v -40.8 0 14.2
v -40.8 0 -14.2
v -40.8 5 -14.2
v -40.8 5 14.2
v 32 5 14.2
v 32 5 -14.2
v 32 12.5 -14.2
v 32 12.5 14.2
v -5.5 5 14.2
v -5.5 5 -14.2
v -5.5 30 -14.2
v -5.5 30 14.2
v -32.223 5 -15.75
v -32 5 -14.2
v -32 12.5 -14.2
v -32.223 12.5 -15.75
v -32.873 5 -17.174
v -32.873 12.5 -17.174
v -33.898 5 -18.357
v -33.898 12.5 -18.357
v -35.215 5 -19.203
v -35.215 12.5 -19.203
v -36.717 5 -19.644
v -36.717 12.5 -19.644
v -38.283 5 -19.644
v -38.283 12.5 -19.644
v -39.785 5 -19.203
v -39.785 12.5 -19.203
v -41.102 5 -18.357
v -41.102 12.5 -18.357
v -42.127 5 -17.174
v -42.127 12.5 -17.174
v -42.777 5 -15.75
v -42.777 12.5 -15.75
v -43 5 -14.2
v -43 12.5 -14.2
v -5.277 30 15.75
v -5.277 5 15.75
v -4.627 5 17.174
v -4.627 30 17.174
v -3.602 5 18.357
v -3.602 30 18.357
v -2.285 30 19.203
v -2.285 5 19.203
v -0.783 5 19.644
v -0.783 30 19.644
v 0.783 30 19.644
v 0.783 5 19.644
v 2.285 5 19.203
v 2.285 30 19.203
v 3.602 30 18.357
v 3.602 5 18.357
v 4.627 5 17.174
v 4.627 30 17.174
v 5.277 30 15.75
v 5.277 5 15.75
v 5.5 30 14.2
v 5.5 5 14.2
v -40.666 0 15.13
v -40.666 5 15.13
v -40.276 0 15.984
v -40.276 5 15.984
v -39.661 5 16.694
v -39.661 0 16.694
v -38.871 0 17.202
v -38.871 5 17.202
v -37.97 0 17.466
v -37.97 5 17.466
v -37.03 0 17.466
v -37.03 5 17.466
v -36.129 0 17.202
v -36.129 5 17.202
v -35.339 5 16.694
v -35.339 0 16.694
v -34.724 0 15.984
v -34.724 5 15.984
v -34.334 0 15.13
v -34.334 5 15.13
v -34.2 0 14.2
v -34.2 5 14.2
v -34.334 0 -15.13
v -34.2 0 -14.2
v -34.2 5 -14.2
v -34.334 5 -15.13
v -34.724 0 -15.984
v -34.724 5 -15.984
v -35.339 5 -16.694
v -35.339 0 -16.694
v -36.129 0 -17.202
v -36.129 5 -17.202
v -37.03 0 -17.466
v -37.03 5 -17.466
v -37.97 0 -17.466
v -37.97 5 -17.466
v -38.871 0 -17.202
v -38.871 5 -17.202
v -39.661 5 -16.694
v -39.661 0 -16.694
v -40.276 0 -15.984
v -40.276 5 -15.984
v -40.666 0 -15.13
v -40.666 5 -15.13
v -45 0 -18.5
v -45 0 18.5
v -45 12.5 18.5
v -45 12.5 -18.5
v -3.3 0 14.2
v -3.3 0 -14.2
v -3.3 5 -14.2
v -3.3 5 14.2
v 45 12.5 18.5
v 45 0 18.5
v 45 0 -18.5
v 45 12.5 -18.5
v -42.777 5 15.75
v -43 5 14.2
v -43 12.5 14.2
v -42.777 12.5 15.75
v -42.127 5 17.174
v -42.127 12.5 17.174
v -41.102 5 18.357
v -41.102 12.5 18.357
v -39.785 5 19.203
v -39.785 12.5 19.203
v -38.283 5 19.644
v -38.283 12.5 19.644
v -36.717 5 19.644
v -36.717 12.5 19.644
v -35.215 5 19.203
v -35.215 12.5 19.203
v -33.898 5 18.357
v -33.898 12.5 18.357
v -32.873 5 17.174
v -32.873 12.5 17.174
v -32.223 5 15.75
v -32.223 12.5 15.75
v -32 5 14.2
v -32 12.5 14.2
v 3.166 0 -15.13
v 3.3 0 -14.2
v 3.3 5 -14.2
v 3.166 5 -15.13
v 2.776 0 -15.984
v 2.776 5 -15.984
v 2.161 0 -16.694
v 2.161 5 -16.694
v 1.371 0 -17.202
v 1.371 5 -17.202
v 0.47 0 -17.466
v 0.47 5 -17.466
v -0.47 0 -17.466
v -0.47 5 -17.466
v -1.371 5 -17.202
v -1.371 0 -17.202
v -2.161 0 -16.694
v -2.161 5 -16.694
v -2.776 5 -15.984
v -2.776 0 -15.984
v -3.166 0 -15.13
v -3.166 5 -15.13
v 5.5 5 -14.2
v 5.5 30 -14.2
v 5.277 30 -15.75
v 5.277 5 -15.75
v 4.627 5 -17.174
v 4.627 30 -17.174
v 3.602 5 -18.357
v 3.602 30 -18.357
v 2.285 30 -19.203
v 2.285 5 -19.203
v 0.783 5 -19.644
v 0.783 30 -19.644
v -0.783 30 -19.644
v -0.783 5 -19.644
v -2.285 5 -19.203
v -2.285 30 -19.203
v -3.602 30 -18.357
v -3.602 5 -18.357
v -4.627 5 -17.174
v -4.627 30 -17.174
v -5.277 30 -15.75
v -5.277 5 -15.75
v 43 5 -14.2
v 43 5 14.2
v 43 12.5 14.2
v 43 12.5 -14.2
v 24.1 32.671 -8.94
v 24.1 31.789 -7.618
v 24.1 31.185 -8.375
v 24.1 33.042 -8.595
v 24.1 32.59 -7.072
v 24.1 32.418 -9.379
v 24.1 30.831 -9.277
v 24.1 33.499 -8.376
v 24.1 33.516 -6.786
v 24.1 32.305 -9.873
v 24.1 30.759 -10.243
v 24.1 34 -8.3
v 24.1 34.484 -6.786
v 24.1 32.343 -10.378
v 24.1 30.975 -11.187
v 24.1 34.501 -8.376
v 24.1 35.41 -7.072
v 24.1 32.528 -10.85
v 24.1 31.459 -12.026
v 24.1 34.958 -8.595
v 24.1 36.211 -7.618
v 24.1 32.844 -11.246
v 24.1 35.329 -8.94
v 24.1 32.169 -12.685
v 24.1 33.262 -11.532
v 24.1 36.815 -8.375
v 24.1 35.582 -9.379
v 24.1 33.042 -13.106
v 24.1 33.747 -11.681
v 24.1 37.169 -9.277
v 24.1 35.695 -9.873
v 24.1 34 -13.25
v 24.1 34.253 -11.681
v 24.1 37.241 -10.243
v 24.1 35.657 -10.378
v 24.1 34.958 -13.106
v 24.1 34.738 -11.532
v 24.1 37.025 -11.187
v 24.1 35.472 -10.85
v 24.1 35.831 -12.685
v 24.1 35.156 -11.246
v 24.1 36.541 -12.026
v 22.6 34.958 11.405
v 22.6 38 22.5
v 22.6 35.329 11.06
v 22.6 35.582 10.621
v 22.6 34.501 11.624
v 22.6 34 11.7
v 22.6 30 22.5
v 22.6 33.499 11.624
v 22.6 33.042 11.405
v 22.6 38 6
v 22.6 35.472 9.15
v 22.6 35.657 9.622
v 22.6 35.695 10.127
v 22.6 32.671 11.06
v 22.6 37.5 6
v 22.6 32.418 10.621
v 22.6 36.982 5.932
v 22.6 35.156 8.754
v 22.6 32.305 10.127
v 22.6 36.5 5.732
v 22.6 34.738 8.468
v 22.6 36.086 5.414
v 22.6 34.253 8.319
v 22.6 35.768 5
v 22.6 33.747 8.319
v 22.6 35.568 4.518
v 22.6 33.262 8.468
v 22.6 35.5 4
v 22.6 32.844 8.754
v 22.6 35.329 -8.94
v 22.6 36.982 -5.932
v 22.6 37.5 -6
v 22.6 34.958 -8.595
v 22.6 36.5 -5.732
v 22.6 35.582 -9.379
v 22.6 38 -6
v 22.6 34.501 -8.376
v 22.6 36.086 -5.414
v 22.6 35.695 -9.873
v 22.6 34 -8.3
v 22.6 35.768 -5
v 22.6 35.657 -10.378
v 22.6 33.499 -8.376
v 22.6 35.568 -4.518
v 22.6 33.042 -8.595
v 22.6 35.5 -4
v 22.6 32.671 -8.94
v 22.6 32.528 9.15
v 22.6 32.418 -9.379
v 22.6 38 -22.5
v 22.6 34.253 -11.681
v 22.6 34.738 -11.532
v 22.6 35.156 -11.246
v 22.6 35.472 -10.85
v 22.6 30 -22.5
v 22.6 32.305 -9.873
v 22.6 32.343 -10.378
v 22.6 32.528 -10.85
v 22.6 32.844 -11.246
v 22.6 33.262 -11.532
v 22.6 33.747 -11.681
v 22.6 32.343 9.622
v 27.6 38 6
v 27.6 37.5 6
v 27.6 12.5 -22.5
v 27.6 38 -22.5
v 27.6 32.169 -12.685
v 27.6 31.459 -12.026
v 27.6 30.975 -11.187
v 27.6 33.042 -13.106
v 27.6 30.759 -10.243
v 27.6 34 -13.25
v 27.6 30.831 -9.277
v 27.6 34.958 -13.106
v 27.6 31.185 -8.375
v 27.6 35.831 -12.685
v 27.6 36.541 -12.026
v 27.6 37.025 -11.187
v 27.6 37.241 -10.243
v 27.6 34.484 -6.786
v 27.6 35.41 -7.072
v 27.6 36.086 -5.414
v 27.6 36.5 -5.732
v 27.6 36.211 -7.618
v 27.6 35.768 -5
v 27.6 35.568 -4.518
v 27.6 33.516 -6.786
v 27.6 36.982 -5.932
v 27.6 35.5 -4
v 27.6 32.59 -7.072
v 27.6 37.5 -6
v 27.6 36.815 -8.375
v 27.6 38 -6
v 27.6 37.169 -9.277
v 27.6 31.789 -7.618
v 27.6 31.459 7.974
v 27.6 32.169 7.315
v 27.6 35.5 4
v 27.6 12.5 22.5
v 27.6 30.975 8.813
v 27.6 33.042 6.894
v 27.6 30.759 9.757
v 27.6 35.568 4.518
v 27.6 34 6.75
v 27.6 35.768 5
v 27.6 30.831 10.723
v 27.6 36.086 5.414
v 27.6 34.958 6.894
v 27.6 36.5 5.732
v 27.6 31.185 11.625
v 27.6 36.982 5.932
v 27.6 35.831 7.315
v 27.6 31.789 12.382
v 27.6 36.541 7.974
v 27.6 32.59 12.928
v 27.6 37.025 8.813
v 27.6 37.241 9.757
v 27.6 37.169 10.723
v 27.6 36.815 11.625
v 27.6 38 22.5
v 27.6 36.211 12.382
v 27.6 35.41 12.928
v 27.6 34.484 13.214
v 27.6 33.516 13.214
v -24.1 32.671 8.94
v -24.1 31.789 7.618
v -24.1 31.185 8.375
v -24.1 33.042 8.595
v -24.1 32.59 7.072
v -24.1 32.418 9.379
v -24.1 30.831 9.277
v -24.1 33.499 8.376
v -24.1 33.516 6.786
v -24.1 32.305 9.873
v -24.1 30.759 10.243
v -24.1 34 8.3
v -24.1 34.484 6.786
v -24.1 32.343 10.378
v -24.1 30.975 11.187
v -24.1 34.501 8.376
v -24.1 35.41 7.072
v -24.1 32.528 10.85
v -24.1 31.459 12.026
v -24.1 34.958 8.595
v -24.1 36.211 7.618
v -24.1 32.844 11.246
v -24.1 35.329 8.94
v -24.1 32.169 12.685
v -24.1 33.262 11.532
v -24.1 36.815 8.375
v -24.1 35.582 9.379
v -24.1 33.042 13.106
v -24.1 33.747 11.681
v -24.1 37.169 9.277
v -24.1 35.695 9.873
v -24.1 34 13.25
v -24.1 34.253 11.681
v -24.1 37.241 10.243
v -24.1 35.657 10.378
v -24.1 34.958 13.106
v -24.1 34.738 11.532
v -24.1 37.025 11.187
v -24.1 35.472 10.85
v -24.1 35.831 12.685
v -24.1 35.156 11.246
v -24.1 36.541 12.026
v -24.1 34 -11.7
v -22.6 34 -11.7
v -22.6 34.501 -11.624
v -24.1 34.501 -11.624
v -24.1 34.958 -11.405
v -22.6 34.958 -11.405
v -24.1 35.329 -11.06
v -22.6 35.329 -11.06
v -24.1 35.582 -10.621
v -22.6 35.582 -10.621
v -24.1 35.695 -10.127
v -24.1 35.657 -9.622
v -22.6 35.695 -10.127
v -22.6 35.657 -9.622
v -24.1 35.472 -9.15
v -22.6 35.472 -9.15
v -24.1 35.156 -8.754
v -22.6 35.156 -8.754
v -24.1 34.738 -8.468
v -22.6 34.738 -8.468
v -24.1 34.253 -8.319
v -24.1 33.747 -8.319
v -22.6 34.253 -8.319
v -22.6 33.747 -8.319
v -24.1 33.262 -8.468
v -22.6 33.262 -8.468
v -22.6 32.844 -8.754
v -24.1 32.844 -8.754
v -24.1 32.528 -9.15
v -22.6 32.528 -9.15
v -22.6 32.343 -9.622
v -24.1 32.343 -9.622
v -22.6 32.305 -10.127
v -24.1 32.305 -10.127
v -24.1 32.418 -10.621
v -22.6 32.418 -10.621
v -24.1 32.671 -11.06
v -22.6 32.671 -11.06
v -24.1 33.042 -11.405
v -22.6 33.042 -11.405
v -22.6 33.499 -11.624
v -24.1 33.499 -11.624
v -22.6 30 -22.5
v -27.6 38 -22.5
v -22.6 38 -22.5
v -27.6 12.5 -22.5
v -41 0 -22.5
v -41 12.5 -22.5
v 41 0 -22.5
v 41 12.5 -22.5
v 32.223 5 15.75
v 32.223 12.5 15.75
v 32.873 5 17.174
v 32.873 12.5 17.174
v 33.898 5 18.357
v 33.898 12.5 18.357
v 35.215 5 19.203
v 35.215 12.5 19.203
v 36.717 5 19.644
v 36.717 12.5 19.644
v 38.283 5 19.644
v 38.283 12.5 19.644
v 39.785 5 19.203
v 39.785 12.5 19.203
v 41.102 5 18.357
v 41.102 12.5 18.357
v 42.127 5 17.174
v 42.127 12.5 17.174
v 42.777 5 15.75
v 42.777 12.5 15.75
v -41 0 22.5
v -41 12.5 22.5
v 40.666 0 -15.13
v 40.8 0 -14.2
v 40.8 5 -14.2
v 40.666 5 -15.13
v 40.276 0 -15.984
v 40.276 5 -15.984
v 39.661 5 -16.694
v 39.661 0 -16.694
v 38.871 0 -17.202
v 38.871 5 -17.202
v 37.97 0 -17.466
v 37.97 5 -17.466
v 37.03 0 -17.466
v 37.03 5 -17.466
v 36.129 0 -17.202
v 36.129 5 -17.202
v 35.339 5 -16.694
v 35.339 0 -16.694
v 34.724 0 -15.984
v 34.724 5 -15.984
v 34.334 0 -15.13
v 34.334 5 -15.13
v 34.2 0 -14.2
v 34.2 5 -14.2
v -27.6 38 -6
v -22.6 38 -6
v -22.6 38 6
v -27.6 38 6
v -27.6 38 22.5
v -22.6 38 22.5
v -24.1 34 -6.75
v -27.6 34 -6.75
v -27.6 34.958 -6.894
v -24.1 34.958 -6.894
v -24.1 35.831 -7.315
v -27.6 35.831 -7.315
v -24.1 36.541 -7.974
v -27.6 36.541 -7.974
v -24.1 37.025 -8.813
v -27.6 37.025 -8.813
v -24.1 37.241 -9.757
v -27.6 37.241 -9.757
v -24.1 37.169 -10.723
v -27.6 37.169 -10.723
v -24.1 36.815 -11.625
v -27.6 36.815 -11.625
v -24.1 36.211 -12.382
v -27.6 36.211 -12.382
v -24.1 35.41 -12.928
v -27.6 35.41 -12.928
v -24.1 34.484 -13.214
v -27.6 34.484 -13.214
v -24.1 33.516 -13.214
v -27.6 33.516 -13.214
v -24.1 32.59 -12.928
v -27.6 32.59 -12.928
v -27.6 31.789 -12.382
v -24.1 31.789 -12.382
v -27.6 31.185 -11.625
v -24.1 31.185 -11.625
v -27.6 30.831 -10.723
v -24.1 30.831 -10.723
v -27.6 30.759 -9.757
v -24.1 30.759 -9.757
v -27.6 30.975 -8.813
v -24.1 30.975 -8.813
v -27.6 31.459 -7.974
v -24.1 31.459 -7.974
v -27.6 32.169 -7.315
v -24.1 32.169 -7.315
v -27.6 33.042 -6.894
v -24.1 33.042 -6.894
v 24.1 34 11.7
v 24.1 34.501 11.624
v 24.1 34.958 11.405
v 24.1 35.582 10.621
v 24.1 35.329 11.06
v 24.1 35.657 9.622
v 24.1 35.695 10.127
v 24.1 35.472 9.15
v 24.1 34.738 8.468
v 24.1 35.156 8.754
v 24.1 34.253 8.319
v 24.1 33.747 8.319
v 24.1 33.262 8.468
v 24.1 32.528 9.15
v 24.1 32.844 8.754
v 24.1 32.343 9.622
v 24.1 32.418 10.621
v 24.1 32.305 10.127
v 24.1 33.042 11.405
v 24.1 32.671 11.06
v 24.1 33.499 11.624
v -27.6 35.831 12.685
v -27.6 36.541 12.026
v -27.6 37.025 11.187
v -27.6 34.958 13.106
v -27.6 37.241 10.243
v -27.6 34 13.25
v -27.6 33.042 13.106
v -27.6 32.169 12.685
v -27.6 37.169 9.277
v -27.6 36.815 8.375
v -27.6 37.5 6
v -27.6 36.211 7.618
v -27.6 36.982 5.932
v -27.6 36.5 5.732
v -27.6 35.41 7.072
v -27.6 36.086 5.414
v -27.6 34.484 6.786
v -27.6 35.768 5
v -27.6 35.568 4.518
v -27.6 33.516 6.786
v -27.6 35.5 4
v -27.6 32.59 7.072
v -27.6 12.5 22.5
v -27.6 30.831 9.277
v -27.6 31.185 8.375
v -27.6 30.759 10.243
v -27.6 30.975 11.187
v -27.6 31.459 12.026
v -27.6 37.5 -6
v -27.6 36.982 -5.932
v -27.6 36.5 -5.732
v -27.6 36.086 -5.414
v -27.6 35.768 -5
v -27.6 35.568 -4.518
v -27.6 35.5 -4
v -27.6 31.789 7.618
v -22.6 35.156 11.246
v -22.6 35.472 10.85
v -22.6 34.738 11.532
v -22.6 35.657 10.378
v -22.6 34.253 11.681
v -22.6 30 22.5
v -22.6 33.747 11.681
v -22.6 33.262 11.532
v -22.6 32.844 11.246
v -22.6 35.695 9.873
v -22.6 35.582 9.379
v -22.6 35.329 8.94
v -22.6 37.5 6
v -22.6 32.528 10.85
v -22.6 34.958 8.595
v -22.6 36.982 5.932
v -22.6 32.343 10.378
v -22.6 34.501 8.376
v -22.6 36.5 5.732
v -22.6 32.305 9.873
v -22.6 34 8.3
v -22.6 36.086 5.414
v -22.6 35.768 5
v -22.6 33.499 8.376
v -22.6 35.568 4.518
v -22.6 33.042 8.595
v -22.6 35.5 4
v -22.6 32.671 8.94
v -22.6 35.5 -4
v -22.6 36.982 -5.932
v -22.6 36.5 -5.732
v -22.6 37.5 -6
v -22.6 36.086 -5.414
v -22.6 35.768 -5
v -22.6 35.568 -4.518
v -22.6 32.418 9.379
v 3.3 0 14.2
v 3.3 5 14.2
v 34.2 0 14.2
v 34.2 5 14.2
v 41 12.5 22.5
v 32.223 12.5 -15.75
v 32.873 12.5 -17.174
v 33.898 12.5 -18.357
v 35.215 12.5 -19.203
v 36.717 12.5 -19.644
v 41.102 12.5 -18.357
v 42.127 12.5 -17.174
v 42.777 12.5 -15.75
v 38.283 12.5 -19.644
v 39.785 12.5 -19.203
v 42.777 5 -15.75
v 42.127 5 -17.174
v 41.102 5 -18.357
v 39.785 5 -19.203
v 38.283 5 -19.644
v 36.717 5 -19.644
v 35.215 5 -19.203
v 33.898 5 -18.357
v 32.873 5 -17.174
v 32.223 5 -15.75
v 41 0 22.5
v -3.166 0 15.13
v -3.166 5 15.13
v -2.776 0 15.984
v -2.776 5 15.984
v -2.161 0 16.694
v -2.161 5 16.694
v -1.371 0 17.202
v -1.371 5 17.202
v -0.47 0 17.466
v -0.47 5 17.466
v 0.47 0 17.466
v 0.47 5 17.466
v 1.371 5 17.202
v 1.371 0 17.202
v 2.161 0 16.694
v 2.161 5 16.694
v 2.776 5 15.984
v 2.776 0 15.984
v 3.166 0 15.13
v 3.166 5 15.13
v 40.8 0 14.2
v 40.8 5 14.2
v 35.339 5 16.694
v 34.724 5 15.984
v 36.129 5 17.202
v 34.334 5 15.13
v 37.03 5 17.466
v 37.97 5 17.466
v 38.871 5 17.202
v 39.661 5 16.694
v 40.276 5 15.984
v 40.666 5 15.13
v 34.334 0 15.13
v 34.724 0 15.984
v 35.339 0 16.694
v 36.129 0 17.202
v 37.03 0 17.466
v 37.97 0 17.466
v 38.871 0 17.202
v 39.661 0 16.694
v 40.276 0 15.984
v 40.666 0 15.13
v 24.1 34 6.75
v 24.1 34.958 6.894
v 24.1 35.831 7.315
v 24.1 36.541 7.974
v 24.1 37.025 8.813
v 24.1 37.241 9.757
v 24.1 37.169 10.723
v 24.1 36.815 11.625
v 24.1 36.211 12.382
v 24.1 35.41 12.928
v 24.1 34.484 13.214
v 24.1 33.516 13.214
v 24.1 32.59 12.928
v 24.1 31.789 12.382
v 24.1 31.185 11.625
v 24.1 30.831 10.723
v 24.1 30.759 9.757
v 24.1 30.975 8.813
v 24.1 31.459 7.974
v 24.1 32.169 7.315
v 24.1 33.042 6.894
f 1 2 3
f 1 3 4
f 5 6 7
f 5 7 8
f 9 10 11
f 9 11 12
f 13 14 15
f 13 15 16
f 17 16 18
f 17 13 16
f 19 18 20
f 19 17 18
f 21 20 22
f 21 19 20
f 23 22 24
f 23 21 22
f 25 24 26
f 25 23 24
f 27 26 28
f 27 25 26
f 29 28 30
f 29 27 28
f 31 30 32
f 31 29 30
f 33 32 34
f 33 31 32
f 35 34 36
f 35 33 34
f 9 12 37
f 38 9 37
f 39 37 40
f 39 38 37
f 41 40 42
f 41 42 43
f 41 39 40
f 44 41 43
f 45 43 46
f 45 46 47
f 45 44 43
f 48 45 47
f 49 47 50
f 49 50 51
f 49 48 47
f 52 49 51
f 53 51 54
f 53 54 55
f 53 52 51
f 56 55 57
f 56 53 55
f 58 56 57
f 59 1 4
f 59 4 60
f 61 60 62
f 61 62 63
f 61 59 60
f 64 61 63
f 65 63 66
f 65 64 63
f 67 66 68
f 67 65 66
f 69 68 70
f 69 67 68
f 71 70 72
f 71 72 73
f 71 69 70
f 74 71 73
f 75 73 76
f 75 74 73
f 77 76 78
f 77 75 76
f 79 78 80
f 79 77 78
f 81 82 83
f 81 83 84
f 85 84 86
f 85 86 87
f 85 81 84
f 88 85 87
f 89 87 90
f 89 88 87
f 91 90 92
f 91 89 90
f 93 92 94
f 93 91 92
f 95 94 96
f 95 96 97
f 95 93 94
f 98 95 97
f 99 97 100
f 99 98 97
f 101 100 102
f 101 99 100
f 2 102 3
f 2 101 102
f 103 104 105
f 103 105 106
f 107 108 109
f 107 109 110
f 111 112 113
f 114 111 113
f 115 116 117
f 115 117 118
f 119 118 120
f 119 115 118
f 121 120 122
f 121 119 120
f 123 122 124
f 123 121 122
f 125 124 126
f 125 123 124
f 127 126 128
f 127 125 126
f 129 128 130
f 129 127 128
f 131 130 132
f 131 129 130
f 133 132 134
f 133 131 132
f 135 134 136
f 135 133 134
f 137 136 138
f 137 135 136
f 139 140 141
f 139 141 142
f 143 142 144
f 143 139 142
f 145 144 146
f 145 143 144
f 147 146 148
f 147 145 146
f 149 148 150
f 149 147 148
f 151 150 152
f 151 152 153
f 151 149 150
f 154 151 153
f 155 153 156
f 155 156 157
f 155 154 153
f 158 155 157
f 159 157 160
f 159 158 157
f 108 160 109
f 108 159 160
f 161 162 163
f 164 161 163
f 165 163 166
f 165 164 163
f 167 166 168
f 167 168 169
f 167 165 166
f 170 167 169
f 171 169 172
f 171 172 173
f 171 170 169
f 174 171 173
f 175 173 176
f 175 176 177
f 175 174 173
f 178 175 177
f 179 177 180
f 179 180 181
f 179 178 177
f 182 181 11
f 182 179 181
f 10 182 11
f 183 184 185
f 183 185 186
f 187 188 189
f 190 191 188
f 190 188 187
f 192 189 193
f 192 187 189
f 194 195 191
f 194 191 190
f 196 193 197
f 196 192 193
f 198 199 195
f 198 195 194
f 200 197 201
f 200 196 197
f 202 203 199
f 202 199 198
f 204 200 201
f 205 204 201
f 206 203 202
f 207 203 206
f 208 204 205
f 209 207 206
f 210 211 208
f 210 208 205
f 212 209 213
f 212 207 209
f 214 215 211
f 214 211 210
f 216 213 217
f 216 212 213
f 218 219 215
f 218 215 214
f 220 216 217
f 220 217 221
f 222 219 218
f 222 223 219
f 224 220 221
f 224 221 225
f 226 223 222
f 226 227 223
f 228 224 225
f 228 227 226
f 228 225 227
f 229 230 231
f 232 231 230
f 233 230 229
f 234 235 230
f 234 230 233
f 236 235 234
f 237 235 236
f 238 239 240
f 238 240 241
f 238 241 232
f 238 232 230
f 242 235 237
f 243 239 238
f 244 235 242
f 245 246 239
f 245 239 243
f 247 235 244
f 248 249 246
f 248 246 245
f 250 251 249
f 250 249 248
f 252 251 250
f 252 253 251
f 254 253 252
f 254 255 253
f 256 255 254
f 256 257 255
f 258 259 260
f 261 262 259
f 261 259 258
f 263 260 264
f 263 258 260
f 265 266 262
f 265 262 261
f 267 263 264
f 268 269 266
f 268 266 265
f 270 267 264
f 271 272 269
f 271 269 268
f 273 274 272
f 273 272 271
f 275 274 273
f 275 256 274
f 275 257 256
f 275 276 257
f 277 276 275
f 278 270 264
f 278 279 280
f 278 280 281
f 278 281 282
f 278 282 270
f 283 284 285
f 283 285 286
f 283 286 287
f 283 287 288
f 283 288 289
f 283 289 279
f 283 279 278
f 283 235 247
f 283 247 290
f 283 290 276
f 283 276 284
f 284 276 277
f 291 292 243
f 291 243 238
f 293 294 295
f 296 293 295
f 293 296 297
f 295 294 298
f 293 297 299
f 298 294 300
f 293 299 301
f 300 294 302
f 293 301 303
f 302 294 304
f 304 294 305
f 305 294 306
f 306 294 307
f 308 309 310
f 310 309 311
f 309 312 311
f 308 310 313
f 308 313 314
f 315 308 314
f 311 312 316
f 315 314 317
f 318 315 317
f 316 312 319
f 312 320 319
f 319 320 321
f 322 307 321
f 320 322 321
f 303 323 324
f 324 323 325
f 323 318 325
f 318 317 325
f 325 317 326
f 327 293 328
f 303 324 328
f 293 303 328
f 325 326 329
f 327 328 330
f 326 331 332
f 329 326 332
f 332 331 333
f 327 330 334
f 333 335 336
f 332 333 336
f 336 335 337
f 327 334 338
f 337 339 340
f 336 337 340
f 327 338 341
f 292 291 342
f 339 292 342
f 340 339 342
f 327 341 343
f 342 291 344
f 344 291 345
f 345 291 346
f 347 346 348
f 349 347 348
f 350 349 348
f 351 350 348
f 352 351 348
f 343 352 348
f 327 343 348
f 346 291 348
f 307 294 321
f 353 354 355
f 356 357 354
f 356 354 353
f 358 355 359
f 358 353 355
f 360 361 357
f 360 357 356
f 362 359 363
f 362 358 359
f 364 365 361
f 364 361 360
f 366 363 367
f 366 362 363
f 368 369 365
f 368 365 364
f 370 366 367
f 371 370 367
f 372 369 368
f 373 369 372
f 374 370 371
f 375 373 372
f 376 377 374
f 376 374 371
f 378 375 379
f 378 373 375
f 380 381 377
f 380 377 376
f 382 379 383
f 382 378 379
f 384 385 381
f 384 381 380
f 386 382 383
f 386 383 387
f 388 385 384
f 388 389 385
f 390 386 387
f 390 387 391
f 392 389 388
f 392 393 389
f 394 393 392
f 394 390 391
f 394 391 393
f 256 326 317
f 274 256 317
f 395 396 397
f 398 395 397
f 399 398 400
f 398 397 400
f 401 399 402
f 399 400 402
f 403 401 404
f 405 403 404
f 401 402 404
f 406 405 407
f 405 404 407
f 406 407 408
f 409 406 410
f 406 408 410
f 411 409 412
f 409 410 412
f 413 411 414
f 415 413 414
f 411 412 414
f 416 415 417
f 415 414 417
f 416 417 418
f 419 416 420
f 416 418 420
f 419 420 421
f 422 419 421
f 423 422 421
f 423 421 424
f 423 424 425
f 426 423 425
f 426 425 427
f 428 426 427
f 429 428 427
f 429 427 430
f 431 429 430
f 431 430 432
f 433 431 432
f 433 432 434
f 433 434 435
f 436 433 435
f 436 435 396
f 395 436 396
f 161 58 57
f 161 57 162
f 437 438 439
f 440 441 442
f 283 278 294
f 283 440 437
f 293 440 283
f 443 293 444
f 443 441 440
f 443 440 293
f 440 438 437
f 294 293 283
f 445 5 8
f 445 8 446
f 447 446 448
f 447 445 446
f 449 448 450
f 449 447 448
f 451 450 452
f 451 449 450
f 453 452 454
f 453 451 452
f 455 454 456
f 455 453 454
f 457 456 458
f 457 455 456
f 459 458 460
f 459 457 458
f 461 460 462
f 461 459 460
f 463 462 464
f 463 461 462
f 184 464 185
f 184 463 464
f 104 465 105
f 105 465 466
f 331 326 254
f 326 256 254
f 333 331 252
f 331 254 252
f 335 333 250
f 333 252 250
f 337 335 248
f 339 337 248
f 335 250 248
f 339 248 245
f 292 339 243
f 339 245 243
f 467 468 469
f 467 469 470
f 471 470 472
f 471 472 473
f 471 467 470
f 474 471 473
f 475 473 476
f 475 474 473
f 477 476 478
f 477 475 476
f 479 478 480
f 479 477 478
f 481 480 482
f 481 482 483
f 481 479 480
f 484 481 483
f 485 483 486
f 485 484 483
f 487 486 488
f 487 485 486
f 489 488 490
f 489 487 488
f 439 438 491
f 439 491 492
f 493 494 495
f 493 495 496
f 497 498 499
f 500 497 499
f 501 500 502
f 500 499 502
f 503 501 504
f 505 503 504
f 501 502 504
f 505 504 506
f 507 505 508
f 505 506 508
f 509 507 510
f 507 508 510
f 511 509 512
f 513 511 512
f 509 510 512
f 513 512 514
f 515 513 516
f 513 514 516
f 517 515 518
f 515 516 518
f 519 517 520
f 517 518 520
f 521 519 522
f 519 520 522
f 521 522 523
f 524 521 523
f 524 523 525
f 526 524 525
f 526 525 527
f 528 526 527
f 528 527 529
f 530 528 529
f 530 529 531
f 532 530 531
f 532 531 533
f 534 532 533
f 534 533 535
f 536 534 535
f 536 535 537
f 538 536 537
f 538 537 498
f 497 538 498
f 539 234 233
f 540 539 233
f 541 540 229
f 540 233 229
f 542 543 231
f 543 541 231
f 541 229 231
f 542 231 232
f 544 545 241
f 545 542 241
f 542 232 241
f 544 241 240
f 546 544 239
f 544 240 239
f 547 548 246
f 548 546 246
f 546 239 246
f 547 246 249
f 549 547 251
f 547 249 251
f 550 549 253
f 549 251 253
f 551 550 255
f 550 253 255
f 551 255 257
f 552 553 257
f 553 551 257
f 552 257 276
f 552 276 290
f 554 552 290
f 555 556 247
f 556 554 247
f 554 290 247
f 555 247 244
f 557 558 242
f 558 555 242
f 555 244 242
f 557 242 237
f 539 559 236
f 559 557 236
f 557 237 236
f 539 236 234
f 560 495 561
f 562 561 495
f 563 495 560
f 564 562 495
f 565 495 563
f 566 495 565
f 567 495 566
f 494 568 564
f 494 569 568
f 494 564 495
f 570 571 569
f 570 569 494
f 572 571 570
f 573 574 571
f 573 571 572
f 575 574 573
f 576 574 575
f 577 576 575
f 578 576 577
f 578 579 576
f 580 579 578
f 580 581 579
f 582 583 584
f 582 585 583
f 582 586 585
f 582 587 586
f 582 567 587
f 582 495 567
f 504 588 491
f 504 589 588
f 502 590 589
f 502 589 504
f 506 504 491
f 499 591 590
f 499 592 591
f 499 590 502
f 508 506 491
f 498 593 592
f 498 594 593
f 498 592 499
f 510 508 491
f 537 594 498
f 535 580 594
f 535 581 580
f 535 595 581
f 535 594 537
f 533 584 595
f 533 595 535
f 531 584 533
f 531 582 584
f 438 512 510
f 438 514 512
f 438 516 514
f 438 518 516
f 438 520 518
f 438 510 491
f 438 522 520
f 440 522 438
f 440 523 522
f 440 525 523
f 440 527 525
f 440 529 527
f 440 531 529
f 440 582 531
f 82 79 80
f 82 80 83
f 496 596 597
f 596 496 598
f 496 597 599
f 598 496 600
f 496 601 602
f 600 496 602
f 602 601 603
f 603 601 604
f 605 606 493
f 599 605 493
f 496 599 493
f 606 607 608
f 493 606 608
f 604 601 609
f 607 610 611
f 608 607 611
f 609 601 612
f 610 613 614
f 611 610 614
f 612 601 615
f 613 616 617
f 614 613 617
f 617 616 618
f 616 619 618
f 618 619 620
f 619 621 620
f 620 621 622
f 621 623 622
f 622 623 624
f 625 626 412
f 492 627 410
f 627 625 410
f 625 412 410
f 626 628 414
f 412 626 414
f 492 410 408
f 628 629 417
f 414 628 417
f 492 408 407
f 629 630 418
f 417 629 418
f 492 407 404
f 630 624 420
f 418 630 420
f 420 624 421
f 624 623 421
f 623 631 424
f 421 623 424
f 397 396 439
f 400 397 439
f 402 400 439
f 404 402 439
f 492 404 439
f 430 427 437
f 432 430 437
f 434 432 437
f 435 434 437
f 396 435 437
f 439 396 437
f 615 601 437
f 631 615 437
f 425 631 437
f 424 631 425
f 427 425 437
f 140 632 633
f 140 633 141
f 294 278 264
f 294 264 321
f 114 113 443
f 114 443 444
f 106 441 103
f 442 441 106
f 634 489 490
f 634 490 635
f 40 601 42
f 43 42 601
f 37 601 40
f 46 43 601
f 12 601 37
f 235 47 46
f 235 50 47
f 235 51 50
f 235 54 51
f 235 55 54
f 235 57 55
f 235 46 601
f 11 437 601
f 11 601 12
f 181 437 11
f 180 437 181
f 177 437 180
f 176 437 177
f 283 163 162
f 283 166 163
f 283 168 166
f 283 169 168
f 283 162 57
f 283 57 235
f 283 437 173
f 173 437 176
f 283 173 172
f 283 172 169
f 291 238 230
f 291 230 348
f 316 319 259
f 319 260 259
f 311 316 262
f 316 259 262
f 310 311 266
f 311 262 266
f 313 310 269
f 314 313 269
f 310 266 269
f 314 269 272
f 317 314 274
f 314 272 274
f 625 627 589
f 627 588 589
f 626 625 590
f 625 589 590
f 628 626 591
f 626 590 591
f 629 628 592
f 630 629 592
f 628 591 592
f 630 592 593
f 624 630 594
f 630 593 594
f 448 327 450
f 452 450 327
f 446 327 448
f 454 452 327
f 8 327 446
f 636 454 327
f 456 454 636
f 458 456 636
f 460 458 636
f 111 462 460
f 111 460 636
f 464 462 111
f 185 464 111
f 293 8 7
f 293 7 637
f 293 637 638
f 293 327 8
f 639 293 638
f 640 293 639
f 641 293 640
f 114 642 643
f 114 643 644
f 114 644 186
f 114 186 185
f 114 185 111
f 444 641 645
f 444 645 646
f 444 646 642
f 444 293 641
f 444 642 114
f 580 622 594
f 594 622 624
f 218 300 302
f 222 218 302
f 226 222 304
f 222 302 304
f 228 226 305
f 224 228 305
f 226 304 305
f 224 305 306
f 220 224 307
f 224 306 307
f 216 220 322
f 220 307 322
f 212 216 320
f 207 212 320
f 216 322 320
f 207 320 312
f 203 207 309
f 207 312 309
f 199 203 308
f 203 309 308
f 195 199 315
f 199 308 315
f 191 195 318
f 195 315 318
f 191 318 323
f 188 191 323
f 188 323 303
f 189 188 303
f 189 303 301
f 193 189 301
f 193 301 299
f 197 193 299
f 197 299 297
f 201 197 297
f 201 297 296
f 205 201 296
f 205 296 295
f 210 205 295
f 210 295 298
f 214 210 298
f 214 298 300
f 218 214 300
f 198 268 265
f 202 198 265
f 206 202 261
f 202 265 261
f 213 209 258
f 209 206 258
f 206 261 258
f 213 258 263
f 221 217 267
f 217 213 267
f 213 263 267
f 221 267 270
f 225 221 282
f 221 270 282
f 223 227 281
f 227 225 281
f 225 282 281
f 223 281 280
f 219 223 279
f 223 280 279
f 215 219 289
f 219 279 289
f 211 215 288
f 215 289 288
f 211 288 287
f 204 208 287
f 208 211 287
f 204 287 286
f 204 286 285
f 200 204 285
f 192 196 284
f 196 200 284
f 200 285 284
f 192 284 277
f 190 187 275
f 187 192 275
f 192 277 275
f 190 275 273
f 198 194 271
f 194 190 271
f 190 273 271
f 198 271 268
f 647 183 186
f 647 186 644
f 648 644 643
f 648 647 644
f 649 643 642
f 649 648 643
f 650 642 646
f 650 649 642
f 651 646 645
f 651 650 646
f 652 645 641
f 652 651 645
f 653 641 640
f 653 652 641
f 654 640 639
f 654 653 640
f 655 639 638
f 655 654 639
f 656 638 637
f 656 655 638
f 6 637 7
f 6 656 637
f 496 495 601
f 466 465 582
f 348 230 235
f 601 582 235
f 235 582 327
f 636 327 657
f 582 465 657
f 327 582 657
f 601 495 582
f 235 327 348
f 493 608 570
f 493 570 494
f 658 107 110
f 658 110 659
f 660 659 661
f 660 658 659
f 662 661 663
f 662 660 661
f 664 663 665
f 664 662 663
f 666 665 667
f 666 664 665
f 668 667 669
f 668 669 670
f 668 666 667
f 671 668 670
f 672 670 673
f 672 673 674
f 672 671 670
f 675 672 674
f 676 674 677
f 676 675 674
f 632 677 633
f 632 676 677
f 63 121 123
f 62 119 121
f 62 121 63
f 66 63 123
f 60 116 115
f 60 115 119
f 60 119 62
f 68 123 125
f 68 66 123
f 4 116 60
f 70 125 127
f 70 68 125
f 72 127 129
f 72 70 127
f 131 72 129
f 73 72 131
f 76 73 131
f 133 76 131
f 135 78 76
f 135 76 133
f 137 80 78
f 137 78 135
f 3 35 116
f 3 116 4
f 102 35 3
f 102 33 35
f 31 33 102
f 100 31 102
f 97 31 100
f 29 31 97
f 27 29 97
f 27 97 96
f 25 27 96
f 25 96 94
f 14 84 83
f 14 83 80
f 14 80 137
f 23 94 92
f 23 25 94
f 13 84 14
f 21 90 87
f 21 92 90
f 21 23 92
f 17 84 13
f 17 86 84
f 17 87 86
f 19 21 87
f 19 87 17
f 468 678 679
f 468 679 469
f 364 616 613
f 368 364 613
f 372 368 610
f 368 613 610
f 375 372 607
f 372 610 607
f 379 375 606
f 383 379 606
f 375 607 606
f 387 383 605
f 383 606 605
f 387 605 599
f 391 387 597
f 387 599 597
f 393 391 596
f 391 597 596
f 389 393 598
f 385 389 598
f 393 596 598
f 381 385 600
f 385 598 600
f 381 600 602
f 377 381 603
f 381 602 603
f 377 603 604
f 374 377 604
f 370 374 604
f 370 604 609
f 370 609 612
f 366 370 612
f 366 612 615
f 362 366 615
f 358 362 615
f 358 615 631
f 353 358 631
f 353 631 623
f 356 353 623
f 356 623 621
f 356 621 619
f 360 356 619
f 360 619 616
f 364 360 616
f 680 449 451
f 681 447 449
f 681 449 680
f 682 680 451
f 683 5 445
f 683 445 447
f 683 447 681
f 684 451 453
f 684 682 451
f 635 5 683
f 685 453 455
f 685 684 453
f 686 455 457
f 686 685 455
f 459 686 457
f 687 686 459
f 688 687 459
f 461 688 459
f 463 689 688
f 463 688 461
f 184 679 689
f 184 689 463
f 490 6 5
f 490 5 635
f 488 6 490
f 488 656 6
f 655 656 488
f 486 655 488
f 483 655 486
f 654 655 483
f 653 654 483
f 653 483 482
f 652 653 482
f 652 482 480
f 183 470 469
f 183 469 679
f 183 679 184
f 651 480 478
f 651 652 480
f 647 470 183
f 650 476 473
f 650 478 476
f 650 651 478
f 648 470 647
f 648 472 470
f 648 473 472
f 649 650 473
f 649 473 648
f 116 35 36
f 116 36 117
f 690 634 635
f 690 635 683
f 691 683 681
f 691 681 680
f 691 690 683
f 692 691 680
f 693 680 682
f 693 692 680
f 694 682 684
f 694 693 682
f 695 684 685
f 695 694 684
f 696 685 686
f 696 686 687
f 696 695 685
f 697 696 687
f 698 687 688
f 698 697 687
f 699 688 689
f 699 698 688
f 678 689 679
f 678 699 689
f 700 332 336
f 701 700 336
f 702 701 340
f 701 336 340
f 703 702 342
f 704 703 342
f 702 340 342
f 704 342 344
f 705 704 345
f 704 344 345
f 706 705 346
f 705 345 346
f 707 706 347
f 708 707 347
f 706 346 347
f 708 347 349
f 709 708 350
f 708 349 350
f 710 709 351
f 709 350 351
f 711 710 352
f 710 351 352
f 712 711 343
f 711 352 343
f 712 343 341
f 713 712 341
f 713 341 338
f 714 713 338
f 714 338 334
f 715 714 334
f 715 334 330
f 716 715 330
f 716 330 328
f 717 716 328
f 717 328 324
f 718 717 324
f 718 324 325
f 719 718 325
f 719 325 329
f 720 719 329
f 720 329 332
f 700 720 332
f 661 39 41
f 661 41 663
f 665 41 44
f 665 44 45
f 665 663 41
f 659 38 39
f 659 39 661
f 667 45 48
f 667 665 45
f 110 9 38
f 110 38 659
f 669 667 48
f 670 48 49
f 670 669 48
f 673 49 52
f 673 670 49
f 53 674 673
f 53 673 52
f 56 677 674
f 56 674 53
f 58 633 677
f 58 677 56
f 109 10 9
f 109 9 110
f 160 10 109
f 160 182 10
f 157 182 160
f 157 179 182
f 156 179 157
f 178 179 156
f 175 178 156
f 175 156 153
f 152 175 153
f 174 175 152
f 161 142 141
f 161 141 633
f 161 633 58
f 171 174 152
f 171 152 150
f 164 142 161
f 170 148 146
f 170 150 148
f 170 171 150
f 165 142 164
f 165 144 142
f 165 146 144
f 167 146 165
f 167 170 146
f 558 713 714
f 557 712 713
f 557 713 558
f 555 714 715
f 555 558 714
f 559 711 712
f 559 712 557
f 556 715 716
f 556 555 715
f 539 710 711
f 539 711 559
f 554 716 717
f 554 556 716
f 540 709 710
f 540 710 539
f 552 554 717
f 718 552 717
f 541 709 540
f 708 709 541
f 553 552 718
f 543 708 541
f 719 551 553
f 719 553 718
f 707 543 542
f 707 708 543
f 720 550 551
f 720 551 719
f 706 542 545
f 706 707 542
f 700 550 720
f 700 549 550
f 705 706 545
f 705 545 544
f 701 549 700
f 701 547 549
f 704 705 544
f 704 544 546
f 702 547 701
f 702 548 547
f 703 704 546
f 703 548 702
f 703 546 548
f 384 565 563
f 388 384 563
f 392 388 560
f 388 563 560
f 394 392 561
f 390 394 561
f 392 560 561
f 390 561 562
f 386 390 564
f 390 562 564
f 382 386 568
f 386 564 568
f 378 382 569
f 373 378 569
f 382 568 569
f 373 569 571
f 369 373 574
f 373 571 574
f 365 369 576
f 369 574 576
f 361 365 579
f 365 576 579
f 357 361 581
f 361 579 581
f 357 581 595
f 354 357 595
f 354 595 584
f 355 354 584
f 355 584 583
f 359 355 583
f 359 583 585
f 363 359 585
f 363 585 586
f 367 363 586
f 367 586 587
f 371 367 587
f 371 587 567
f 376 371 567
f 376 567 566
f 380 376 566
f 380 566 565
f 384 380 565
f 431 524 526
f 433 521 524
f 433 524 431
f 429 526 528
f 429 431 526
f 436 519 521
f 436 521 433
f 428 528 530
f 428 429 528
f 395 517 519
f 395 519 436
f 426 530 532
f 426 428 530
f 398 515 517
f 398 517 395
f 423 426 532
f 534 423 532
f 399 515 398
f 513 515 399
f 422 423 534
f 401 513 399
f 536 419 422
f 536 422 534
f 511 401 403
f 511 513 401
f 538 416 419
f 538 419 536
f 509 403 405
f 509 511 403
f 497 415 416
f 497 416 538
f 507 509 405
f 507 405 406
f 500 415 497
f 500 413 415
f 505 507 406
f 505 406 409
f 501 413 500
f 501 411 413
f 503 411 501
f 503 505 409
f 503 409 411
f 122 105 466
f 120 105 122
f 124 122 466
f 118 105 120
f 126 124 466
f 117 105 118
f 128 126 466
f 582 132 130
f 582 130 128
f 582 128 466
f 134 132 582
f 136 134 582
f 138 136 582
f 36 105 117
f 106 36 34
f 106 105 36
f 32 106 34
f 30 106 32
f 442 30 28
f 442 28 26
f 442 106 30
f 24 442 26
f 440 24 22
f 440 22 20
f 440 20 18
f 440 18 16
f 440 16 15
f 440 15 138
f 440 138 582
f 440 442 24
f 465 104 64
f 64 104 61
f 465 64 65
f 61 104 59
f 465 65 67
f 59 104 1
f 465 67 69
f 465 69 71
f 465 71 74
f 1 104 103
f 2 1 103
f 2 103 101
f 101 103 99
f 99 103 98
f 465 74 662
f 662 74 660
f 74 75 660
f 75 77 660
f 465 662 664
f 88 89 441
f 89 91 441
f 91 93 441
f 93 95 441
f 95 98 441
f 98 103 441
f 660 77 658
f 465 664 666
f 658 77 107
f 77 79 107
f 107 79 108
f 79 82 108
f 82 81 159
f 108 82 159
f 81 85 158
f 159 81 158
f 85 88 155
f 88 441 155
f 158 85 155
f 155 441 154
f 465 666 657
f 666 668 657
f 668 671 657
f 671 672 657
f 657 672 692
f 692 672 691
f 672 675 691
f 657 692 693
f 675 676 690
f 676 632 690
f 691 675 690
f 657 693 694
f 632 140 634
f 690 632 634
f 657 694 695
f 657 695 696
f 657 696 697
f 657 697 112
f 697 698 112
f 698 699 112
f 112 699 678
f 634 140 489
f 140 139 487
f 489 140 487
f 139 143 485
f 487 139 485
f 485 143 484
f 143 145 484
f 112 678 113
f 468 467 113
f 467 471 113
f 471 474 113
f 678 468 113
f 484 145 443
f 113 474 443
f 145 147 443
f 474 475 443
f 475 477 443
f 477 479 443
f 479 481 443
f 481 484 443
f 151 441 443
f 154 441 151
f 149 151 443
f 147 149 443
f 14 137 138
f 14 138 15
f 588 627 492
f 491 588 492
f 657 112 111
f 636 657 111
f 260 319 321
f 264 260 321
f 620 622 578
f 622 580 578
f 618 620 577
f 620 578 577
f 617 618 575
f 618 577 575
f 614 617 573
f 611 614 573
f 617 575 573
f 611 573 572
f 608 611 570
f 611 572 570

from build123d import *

# Parameters (mm, degrees)
SKETCH1_W                                           = 90
SKETCH1_H                                           = 45
BOSS_EXTRUDE1_DEPTH                                 = 30
SKETCH2_W                                           = 5
SKETCH2_H                                           = 45
BOSS_EXTRUDE2_DEPTH                                 = 8
CBORE_START                                         = 5
CBORE_SLOT_FOR_M6_HEX_SOCKET_HEAD_CAP_SC_DEPTH      = 25
CBORE_SLOT_FOR_M6_HEX_SOCKET_HEAD_CA_3_DEPTH        = 5
CHAMFER2_SIZE                                       = 4
CBORE_FOR_M3_HEX_SOCKET_HEAD_CAP_SCREW1_D           = 3.4
CBORE_FOR_M3_HEX_SOCKET_HEAD_CAP_SCREW1_DEPTH       = 5
CBORE_FOR_M3_HEX_SOCKET_HEAD_CAP_SCREW1_CBORE_D     = 6.5
CBORE_FOR_M3_HEX_SOCKET_HEAD_CAP_SCREW1_CBORE_DEPTH = 3.5
CBORE_FOR_M3_HEX_SOCKET_HEAD_CAP_SCREW2_D           = 3.4
CBORE_FOR_M3_HEX_SOCKET_HEAD_CAP_SCREW2_CBORE_D     = 6.5
CBORE_FOR_M3_HEX_SOCKET_HEAD_CAP_SCREW2_CBORE_DEPTH = 3.5
CUT_EXTRUDE1_REACH                                  = 86.977
SKETCH11_W                                          = 12
SKETCH11_H                                          = 2.5
FILLET1_R                                           = 2
CUT_EXTRUDE3_DEPTH                                  = 17.5


# Read off the part's stored shape, not the designer's step: CBORE SLOT for M6 Hex Socket Head Cap Screw1
with BuildPart() as part:
    # Sketch1 → Boss-Extrude1 (new body)
    with BuildSketch(Plane(origin=(0, 0, 0), x_dir=(1, 0, 0), z_dir=(0, 1, 0))):
        Rectangle(SKETCH1_W, SKETCH1_H)
    extrude(amount=BOSS_EXTRUDE1_DEPTH)

    # Sketch2 → Boss-Extrude2 (add)
    with BuildSketch(Plane(origin=(0, 30, 0), x_dir=(1, 0, 0), z_dir=(0, 1, 0))):
        with Locations((-25.1, 0)):
            Rectangle(SKETCH2_W, SKETCH2_H)
        with Locations((25.1, 0)):
            Rectangle(SKETCH2_W, SKETCH2_H)
    extrude(amount=BOSS_EXTRUDE2_DEPTH)

    # CBORE SLOT for M6 Hex Socket Head Ca 2 → CBORE SLOT for M6 Hex Socket Head Cap Screw1 (cut)
    with BuildSketch(Plane(origin=(0, 0, 0), x_dir=(1, 0, 0), z_dir=(0, 1, 0)).offset(CBORE_START)):
        with BuildLine():
            Line((-5.5, 14.2), (-5.5, -14.2))
            ThreePointArc((-5.5, -14.2), (0, -19.7), (5.5, -14.2))
            Line((5.5, -14.2), (5.5, 14.2))
            ThreePointArc((5.5, 14.2), (0, 19.7), (-5.5, 14.2))
        make_face()
        with BuildLine():
            Line((32, 14.2), (32, -14.2))
            ThreePointArc((32, -14.2), (37.5, -19.7), (43, -14.2))
            Line((43, -14.2), (43, 14.2))
            ThreePointArc((43, 14.2), (37.5, 19.7), (32, 14.2))
        make_face()
        with BuildLine():
            Line((-43, 14.2), (-43, -14.2))
            ThreePointArc((-43, -14.2), (-37.5, -19.7), (-32, -14.2))
            Line((-32, -14.2), (-32, 14.2))
            ThreePointArc((-32, 14.2), (-37.5, 19.7), (-43, 14.2))
        make_face()
    extrude(amount=CBORE_SLOT_FOR_M6_HEX_SOCKET_HEAD_CAP_SC_DEPTH, mode=Mode.SUBTRACT)

    # CBORE SLOT for M6 Hex Socket Head Ca 3 o → CBORE SLOT for M6 Hex Socket Head Ca 3 (cut)
    with BuildSketch(Plane(origin=(0, 0, 0), x_dir=(1, 0, 0), z_dir=(0, 1, 0))):
        with BuildLine():
            Line((-3.3, 14.2), (-3.3, -14.2))
            ThreePointArc((-3.3, -14.2), (0, -17.5), (3.3, -14.2))
            Line((3.3, -14.2), (3.3, 14.2))
            ThreePointArc((3.3, 14.2), (0, 17.5), (-3.3, 14.2))
        make_face()
        with BuildLine():
            Line((34.2, 14.2), (34.2, -14.2))
            ThreePointArc((34.2, -14.2), (37.5, -17.5), (40.8, -14.2))
            Line((40.8, -14.2), (40.8, 14.2))
            ThreePointArc((40.8, 14.2), (37.5, 17.5), (34.2, 14.2))
        make_face()
        with BuildLine():
            Line((-40.8, 14.2), (-40.8, -14.2))
            ThreePointArc((-40.8, -14.2), (-37.5, -17.5), (-34.2, -14.2))
            Line((-34.2, -14.2), (-34.2, 14.2))
            ThreePointArc((-34.2, 14.2), (-37.5, 17.5), (-40.8, 14.2))
        make_face()
    extrude(amount=CBORE_SLOT_FOR_M6_HEX_SOCKET_HEAD_CA_3_DEPTH, mode=Mode.SUBTRACT)

    # Chamfer2
    chamfer2_edges = [part.edges().sort_by_distance(p)[0] for p in [
        (-45, 15, -22.5),
        (45, 15, -22.5),
        (45, 15, 22.5),
        (-45, 15, 22.5),
    ]]
    chamfer(chamfer2_edges, length=CHAMFER2_SIZE)

    # CBORE for M3 Hex Socket Head Cap Screw1
    with Locations(Plane(origin=(27.6, 0, 0), x_dir=(0, 0, -1), z_dir=(1, 0, 0))):
        with Locations((-10, 34), (10, 34)):
            CounterBoreHole(CBORE_FOR_M3_HEX_SOCKET_HEAD_CAP_SCREW1_D / 2, CBORE_FOR_M3_HEX_SOCKET_HEAD_CAP_SCREW1_CBORE_D / 2, CBORE_FOR_M3_HEX_SOCKET_HEAD_CAP_SCREW1_CBORE_DEPTH, depth=CBORE_FOR_M3_HEX_SOCKET_HEAD_CAP_SCREW1_DEPTH)

    # CBORE for M3 Hex Socket Head Cap Screw2 (through all)
    with Locations(Plane.ZY.offset(27.6)):
        with Locations((-10, 34), (10, 34)):
            CounterBoreHole(CBORE_FOR_M3_HEX_SOCKET_HEAD_CAP_SCREW2_D / 2, CBORE_FOR_M3_HEX_SOCKET_HEAD_CAP_SCREW2_CBORE_D / 2, CBORE_FOR_M3_HEX_SOCKET_HEAD_CAP_SCREW2_CBORE_DEPTH)

    # Cut-Extrude1: up to this face of the body (flat: up to its plane)
    cut_extrude1_end = Plane(part.part.faces().sort_by_distance((-27.6, 34, 0))[0])
    # Sketch11 → Cut-Extrude1 (cut, up to the picked face)
    with BuildSketch(Plane(origin=(27.6, 0, 0), x_dir=(0, 0, -1), z_dir=(1, 0, 0)), mode=Mode.PRIVATE) as cut_extrude1_sk1:
        with Locations((0, 36.75)):
            Rectangle(SKETCH11_W, SKETCH11_H)
    cut_extrude1_tool1 = split(extrude(cut_extrude1_sk1.sketch, amount=-CUT_EXTRUDE1_REACH, mode=Mode.PRIVATE), bisect_by=cut_extrude1_end, keep=Keep.BOTH, mode=Mode.PRIVATE)
    add(cut_extrude1_tool1.solids().sort_by(Axis((27.6, 36.75, 0), (-1, 0, 0)))[0], mode=Mode.SUBTRACT)

    # Fillet1
    fillet1_edges = [part.edges().sort_by_distance(p)[0] for p in [
        (-25.1, 35.5, -6),
        (25.1, 35.5, -6),
        (-25.1, 35.5, 6),
        (25.1, 35.5, 6),
    ]]
    fillet(fillet1_edges, radius=FILLET1_R)

    # Sketch13 → Cut-Extrude3 (cut)
    with BuildSketch(Plane(origin=(0, 30, 0), x_dir=(1, 0, 0), z_dir=(0, 1, 0))):
        Polygon((-45, 18.5), (-45, -18.5), (-41, -22.5), (-27.6, -22.5), (-27.6, 22.5), (-41, 22.5), align=None)
        Polygon((45, -18.5), (45, 18.5), (41, 22.5), (27.6, 22.5), (27.6, -22.5), (41, -22.5), align=None)
    extrude(amount=-CUT_EXTRUDE3_DEPTH, mode=Mode.SUBTRACT)


solid = part.part
